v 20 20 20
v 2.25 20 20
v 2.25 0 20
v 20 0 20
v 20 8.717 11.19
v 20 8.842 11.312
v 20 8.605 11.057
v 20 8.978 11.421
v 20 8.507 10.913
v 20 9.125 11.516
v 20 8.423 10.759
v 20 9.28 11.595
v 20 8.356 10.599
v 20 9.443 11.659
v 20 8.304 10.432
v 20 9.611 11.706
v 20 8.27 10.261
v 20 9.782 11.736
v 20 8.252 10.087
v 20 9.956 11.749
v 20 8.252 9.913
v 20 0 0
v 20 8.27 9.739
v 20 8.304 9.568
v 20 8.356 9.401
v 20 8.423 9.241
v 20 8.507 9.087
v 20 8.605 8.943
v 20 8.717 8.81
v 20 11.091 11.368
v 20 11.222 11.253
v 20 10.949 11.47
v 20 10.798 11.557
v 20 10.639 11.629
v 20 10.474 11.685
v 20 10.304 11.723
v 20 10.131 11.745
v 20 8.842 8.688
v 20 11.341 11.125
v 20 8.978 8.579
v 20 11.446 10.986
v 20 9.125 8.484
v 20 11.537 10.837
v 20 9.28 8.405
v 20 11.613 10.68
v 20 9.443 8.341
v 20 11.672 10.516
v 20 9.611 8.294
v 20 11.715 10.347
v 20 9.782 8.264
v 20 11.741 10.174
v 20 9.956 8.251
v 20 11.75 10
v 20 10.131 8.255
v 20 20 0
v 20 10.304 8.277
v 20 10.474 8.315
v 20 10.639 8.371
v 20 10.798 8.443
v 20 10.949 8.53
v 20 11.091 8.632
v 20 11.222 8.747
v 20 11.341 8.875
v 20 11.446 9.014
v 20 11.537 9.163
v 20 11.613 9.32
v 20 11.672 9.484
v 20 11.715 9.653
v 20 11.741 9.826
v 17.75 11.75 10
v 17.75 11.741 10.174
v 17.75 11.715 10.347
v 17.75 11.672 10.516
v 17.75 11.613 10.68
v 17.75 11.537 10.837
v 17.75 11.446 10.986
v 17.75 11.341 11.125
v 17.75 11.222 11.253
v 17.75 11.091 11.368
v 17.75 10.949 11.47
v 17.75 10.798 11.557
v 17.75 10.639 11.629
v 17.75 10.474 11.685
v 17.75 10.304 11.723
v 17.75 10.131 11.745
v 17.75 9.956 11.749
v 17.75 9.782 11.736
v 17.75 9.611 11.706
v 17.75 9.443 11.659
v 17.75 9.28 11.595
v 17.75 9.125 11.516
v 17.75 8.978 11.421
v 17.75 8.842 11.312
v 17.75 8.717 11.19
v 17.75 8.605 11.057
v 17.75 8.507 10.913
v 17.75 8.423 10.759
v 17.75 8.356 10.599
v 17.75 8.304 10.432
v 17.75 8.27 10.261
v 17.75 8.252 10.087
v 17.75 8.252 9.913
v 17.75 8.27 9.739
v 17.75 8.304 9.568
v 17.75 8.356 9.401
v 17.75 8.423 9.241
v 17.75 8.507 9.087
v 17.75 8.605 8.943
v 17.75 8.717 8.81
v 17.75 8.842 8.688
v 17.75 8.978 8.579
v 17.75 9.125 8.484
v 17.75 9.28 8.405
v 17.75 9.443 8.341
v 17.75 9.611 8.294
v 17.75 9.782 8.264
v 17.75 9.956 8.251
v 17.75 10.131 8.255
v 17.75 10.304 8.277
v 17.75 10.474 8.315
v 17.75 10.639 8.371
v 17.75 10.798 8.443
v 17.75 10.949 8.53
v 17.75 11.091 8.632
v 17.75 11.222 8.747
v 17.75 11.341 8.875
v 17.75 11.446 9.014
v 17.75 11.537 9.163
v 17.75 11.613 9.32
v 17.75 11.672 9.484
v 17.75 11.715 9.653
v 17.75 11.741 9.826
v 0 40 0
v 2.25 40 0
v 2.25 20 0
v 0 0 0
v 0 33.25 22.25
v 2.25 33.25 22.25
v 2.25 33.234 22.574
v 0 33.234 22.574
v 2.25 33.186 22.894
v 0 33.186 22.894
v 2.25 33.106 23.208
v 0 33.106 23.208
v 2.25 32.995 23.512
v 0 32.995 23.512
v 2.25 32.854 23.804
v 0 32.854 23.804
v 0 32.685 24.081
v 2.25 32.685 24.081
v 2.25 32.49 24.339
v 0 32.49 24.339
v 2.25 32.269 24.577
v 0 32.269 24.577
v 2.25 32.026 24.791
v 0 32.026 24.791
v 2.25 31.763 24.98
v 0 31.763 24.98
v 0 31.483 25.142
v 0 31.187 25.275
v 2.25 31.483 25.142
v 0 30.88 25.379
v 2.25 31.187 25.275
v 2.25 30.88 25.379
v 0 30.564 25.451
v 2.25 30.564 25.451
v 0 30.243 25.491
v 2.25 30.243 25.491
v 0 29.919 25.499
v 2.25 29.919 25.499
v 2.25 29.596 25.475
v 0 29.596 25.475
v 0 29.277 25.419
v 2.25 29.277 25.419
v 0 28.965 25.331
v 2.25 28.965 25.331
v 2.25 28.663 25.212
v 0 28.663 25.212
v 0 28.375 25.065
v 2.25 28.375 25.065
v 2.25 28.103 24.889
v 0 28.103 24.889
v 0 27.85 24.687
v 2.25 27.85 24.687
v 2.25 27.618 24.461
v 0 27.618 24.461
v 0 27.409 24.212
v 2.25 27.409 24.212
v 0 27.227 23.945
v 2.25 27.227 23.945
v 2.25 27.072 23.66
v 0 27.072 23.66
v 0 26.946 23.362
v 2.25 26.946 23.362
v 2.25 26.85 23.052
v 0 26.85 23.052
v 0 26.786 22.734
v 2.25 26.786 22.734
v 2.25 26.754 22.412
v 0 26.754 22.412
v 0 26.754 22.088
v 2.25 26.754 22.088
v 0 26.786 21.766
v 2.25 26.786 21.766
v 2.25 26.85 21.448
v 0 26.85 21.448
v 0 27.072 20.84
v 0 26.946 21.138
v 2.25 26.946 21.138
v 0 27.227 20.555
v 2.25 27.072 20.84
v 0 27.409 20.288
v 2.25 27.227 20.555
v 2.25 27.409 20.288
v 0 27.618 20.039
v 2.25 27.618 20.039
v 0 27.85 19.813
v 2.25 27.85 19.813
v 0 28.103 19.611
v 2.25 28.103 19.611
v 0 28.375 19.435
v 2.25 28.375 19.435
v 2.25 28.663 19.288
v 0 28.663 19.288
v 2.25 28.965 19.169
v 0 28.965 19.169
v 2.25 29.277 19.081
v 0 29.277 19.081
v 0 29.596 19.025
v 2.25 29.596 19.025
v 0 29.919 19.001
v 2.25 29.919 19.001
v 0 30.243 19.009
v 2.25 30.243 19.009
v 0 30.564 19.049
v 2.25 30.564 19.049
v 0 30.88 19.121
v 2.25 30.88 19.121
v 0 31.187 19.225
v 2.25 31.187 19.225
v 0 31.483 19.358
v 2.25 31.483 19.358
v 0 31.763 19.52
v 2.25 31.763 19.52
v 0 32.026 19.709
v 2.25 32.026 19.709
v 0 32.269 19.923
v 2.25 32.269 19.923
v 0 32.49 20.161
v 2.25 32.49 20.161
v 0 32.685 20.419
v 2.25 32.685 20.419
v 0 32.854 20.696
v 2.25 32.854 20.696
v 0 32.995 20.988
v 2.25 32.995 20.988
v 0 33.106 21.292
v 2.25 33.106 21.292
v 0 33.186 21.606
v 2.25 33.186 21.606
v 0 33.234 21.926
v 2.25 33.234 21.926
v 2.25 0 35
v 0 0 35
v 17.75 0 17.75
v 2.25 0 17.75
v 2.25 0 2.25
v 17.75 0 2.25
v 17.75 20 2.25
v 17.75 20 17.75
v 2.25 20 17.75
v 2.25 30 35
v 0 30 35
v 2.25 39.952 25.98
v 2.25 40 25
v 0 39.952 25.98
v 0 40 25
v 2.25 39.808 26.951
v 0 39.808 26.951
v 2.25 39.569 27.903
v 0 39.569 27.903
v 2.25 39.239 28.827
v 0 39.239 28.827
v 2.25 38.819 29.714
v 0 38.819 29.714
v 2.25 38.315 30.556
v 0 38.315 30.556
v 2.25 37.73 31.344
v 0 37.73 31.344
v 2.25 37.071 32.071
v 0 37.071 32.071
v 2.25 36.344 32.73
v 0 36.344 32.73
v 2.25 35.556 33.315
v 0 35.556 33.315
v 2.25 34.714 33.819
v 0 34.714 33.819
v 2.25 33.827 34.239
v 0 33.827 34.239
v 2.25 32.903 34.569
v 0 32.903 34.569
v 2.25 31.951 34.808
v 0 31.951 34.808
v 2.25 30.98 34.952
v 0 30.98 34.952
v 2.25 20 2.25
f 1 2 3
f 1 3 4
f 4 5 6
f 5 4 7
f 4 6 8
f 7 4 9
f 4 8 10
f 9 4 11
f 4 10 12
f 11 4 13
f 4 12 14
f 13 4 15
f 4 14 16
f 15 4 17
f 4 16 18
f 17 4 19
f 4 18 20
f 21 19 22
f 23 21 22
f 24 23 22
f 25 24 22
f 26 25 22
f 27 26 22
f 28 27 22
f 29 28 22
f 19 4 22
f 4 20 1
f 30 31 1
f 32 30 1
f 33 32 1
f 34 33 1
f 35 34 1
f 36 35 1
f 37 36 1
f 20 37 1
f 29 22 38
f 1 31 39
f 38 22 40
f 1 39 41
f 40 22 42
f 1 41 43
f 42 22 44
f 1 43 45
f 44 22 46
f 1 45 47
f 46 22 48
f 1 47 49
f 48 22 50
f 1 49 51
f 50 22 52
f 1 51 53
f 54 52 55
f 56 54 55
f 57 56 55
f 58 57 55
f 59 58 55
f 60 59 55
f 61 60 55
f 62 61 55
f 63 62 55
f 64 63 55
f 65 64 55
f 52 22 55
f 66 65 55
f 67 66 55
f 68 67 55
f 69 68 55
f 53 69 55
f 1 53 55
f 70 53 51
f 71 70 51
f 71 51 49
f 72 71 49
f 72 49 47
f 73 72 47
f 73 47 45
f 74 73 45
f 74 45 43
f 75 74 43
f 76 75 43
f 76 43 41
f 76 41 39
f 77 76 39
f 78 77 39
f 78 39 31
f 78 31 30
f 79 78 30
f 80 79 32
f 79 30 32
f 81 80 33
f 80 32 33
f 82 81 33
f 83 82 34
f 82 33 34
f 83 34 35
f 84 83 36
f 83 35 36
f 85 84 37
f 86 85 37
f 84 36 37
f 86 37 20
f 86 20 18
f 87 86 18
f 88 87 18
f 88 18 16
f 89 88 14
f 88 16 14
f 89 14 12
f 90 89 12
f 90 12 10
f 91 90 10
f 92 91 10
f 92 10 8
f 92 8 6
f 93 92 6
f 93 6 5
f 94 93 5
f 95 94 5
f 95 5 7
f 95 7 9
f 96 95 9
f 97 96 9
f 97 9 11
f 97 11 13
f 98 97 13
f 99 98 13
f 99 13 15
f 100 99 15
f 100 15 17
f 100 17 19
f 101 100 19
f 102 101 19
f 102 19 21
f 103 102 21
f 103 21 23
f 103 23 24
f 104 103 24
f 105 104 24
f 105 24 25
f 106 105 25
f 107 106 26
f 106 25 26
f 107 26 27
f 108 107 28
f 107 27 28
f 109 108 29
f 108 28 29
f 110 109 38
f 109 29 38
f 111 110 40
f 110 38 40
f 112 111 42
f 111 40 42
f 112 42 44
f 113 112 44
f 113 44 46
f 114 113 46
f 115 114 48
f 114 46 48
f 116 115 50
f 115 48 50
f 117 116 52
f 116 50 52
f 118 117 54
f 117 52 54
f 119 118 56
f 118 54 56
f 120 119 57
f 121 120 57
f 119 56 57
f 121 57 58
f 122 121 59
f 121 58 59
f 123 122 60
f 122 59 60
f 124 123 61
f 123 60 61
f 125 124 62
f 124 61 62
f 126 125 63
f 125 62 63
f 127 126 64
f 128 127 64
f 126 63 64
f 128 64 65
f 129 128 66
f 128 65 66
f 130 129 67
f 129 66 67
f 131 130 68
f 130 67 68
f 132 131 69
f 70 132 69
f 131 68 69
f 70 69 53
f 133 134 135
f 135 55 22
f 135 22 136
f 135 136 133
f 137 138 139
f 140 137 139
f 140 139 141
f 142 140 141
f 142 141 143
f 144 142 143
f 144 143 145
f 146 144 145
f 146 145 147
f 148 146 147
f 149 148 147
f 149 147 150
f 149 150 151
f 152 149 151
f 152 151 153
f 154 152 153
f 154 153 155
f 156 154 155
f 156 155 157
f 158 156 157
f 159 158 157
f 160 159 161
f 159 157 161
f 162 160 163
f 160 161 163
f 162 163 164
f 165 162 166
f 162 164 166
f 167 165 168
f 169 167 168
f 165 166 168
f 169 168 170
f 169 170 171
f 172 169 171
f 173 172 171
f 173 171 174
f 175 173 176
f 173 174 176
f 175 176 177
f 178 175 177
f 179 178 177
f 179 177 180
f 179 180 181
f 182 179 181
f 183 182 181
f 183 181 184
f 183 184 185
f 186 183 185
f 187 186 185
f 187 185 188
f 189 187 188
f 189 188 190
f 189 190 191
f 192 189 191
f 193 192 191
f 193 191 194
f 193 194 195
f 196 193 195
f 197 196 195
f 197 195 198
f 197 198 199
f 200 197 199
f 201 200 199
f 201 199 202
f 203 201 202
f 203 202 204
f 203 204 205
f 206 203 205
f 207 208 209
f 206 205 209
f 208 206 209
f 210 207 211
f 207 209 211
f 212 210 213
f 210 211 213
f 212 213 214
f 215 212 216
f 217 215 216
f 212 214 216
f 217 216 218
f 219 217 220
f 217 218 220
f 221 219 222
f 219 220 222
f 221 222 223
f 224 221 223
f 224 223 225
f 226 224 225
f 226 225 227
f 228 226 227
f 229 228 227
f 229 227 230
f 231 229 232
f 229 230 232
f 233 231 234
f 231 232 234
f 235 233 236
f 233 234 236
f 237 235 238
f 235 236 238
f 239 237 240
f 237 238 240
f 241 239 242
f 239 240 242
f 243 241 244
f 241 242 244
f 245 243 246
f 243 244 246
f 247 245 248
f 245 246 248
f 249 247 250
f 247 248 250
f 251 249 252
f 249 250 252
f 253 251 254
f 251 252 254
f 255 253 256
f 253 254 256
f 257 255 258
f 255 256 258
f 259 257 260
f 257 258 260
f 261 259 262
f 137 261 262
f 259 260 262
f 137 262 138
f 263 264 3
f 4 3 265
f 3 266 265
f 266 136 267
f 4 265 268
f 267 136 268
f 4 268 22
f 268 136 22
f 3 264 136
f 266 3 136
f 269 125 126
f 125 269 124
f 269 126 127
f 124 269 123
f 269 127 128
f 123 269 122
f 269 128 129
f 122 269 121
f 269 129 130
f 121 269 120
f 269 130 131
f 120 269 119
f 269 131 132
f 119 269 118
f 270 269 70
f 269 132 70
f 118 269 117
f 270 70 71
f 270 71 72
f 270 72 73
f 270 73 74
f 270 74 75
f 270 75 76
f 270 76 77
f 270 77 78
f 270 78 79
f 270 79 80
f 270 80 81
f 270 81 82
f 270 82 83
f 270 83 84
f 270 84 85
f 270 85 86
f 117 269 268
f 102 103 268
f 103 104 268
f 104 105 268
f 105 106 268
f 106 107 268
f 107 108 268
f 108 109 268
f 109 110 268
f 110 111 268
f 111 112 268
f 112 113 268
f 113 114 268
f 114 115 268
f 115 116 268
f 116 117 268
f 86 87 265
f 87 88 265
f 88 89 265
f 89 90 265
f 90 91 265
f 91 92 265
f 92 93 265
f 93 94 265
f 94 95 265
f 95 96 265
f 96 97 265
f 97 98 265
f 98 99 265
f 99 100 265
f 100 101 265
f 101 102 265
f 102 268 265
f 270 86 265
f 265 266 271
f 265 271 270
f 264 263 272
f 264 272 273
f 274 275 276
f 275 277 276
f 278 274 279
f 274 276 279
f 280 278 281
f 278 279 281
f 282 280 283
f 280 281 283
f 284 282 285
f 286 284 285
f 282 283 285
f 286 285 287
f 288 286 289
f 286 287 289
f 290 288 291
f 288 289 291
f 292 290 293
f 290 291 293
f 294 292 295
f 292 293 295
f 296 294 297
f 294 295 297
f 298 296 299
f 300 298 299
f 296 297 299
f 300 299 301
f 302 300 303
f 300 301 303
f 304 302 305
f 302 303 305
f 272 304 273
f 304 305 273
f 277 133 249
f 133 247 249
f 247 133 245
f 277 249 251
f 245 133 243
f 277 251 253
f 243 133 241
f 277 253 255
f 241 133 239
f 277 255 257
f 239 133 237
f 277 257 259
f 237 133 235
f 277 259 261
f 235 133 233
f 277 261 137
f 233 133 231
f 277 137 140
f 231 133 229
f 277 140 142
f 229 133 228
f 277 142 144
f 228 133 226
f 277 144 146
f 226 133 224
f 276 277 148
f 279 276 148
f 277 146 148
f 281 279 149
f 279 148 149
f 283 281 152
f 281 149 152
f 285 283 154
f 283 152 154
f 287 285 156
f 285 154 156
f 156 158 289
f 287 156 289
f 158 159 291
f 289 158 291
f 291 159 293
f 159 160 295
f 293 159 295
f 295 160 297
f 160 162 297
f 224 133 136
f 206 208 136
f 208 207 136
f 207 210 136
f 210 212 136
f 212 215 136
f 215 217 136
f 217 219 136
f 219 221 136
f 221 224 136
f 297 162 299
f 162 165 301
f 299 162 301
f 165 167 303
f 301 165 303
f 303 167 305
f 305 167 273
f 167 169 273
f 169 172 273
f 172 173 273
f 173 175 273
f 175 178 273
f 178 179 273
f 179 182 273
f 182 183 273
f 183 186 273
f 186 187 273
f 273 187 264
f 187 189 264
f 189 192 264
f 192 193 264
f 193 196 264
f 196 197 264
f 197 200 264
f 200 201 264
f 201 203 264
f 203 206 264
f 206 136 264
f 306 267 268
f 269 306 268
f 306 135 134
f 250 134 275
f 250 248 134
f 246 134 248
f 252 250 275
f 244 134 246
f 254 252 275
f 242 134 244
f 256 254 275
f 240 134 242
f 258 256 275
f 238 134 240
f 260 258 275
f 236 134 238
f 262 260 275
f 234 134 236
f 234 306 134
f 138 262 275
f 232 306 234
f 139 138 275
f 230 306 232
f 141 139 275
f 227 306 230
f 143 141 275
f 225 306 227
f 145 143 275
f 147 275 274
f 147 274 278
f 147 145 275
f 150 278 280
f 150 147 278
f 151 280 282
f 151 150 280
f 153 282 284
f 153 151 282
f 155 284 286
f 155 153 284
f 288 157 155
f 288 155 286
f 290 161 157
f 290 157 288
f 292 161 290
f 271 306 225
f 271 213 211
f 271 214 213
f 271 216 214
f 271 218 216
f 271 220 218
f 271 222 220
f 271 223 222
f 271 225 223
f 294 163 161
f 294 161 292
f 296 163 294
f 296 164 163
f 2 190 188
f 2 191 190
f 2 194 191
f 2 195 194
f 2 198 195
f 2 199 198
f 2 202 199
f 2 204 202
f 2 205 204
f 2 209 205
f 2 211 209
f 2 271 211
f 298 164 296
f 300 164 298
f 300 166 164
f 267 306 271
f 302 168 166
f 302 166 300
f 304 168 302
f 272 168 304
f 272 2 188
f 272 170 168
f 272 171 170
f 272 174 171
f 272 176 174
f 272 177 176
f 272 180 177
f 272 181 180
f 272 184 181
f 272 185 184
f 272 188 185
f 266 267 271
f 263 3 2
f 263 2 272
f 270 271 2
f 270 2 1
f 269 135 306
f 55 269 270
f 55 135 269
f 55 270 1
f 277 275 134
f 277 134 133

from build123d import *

# Parameters (mm, degrees)
F0_W          = 20
F0_H          = 20
F1_DEPTH      = 20
F2_W          = 15.5
F2_H          = 15.5
F3_DEPTH      = 25
F3_DEPTH_BACK = 25
F4_W          = 2.25
F4_H          = 20
F5_DEPTH      = 15
F6_W          = 2.25
F6_H          = 35
F7_DEPTH      = 20
F8_R          = 3.25
F9_DEPTH      = 25
F9_DEPTH_BACK = 25
F10_R         = 1.75
F11_DEPTH     = 5
F12_R         = 10


with BuildPart() as f1:
    # F0 (on Top) → F1 (new body)
    with BuildSketch(Plane.XY):
        with Locations((10, 10)):
            Rectangle(F0_W, F0_H)
    extrude(amount=F1_DEPTH)

    # F2 (on face) → F3 (cut, two sides)
    with BuildSketch(Plane.XZ) as f3_sk:
        with Locations((10, 10)):
            Rectangle(F2_W, F2_H)
    extrude(amount=F3_DEPTH, mode=Mode.SUBTRACT)
    extrude(f3_sk.sketch, amount=-F3_DEPTH_BACK, mode=Mode.SUBTRACT)

    # F4 (on face) → F5 (join)
    with BuildSketch(Plane.XY.offset(20)):
        with Locations((1.125, 10)):
            Rectangle(F4_W, F4_H)
    extrude(amount=F5_DEPTH)

    # F6 (on face) → F7 (join)
    with BuildSketch(Plane(origin=(0, 20, 0), x_dir=(-1, 0, 0), z_dir=(0, 1, 0))):
        with Locations((-1.125, 17.5)):
            Rectangle(F6_W, F6_H)
    extrude(amount=F7_DEPTH)

    # F8 (on face) → F9 (cut, two sides)
    with BuildSketch(Plane.YZ.offset(2.25)) as f9_sk:
        with Locations((30, 22.25)):
            Circle(F8_R)
    extrude(amount=-F9_DEPTH, mode=Mode.SUBTRACT)
    extrude(f9_sk.sketch, amount=-F9_DEPTH_BACK, mode=Mode.SUBTRACT)

    # F10 (on face) → F11 (cut)
    with BuildSketch(Plane.YZ.offset(20)):
        with Locations((10, 10)):
            Circle(F10_R)
    extrude(amount=-F11_DEPTH, mode=Mode.SUBTRACT)

    # F12
    f12_edges = [f1.edges().sort_by_distance(p)[0] for p in [
        (1.125, 40, 35),
    ]]
    fillet(f12_edges, radius=F12_R)


solid = f1.part
